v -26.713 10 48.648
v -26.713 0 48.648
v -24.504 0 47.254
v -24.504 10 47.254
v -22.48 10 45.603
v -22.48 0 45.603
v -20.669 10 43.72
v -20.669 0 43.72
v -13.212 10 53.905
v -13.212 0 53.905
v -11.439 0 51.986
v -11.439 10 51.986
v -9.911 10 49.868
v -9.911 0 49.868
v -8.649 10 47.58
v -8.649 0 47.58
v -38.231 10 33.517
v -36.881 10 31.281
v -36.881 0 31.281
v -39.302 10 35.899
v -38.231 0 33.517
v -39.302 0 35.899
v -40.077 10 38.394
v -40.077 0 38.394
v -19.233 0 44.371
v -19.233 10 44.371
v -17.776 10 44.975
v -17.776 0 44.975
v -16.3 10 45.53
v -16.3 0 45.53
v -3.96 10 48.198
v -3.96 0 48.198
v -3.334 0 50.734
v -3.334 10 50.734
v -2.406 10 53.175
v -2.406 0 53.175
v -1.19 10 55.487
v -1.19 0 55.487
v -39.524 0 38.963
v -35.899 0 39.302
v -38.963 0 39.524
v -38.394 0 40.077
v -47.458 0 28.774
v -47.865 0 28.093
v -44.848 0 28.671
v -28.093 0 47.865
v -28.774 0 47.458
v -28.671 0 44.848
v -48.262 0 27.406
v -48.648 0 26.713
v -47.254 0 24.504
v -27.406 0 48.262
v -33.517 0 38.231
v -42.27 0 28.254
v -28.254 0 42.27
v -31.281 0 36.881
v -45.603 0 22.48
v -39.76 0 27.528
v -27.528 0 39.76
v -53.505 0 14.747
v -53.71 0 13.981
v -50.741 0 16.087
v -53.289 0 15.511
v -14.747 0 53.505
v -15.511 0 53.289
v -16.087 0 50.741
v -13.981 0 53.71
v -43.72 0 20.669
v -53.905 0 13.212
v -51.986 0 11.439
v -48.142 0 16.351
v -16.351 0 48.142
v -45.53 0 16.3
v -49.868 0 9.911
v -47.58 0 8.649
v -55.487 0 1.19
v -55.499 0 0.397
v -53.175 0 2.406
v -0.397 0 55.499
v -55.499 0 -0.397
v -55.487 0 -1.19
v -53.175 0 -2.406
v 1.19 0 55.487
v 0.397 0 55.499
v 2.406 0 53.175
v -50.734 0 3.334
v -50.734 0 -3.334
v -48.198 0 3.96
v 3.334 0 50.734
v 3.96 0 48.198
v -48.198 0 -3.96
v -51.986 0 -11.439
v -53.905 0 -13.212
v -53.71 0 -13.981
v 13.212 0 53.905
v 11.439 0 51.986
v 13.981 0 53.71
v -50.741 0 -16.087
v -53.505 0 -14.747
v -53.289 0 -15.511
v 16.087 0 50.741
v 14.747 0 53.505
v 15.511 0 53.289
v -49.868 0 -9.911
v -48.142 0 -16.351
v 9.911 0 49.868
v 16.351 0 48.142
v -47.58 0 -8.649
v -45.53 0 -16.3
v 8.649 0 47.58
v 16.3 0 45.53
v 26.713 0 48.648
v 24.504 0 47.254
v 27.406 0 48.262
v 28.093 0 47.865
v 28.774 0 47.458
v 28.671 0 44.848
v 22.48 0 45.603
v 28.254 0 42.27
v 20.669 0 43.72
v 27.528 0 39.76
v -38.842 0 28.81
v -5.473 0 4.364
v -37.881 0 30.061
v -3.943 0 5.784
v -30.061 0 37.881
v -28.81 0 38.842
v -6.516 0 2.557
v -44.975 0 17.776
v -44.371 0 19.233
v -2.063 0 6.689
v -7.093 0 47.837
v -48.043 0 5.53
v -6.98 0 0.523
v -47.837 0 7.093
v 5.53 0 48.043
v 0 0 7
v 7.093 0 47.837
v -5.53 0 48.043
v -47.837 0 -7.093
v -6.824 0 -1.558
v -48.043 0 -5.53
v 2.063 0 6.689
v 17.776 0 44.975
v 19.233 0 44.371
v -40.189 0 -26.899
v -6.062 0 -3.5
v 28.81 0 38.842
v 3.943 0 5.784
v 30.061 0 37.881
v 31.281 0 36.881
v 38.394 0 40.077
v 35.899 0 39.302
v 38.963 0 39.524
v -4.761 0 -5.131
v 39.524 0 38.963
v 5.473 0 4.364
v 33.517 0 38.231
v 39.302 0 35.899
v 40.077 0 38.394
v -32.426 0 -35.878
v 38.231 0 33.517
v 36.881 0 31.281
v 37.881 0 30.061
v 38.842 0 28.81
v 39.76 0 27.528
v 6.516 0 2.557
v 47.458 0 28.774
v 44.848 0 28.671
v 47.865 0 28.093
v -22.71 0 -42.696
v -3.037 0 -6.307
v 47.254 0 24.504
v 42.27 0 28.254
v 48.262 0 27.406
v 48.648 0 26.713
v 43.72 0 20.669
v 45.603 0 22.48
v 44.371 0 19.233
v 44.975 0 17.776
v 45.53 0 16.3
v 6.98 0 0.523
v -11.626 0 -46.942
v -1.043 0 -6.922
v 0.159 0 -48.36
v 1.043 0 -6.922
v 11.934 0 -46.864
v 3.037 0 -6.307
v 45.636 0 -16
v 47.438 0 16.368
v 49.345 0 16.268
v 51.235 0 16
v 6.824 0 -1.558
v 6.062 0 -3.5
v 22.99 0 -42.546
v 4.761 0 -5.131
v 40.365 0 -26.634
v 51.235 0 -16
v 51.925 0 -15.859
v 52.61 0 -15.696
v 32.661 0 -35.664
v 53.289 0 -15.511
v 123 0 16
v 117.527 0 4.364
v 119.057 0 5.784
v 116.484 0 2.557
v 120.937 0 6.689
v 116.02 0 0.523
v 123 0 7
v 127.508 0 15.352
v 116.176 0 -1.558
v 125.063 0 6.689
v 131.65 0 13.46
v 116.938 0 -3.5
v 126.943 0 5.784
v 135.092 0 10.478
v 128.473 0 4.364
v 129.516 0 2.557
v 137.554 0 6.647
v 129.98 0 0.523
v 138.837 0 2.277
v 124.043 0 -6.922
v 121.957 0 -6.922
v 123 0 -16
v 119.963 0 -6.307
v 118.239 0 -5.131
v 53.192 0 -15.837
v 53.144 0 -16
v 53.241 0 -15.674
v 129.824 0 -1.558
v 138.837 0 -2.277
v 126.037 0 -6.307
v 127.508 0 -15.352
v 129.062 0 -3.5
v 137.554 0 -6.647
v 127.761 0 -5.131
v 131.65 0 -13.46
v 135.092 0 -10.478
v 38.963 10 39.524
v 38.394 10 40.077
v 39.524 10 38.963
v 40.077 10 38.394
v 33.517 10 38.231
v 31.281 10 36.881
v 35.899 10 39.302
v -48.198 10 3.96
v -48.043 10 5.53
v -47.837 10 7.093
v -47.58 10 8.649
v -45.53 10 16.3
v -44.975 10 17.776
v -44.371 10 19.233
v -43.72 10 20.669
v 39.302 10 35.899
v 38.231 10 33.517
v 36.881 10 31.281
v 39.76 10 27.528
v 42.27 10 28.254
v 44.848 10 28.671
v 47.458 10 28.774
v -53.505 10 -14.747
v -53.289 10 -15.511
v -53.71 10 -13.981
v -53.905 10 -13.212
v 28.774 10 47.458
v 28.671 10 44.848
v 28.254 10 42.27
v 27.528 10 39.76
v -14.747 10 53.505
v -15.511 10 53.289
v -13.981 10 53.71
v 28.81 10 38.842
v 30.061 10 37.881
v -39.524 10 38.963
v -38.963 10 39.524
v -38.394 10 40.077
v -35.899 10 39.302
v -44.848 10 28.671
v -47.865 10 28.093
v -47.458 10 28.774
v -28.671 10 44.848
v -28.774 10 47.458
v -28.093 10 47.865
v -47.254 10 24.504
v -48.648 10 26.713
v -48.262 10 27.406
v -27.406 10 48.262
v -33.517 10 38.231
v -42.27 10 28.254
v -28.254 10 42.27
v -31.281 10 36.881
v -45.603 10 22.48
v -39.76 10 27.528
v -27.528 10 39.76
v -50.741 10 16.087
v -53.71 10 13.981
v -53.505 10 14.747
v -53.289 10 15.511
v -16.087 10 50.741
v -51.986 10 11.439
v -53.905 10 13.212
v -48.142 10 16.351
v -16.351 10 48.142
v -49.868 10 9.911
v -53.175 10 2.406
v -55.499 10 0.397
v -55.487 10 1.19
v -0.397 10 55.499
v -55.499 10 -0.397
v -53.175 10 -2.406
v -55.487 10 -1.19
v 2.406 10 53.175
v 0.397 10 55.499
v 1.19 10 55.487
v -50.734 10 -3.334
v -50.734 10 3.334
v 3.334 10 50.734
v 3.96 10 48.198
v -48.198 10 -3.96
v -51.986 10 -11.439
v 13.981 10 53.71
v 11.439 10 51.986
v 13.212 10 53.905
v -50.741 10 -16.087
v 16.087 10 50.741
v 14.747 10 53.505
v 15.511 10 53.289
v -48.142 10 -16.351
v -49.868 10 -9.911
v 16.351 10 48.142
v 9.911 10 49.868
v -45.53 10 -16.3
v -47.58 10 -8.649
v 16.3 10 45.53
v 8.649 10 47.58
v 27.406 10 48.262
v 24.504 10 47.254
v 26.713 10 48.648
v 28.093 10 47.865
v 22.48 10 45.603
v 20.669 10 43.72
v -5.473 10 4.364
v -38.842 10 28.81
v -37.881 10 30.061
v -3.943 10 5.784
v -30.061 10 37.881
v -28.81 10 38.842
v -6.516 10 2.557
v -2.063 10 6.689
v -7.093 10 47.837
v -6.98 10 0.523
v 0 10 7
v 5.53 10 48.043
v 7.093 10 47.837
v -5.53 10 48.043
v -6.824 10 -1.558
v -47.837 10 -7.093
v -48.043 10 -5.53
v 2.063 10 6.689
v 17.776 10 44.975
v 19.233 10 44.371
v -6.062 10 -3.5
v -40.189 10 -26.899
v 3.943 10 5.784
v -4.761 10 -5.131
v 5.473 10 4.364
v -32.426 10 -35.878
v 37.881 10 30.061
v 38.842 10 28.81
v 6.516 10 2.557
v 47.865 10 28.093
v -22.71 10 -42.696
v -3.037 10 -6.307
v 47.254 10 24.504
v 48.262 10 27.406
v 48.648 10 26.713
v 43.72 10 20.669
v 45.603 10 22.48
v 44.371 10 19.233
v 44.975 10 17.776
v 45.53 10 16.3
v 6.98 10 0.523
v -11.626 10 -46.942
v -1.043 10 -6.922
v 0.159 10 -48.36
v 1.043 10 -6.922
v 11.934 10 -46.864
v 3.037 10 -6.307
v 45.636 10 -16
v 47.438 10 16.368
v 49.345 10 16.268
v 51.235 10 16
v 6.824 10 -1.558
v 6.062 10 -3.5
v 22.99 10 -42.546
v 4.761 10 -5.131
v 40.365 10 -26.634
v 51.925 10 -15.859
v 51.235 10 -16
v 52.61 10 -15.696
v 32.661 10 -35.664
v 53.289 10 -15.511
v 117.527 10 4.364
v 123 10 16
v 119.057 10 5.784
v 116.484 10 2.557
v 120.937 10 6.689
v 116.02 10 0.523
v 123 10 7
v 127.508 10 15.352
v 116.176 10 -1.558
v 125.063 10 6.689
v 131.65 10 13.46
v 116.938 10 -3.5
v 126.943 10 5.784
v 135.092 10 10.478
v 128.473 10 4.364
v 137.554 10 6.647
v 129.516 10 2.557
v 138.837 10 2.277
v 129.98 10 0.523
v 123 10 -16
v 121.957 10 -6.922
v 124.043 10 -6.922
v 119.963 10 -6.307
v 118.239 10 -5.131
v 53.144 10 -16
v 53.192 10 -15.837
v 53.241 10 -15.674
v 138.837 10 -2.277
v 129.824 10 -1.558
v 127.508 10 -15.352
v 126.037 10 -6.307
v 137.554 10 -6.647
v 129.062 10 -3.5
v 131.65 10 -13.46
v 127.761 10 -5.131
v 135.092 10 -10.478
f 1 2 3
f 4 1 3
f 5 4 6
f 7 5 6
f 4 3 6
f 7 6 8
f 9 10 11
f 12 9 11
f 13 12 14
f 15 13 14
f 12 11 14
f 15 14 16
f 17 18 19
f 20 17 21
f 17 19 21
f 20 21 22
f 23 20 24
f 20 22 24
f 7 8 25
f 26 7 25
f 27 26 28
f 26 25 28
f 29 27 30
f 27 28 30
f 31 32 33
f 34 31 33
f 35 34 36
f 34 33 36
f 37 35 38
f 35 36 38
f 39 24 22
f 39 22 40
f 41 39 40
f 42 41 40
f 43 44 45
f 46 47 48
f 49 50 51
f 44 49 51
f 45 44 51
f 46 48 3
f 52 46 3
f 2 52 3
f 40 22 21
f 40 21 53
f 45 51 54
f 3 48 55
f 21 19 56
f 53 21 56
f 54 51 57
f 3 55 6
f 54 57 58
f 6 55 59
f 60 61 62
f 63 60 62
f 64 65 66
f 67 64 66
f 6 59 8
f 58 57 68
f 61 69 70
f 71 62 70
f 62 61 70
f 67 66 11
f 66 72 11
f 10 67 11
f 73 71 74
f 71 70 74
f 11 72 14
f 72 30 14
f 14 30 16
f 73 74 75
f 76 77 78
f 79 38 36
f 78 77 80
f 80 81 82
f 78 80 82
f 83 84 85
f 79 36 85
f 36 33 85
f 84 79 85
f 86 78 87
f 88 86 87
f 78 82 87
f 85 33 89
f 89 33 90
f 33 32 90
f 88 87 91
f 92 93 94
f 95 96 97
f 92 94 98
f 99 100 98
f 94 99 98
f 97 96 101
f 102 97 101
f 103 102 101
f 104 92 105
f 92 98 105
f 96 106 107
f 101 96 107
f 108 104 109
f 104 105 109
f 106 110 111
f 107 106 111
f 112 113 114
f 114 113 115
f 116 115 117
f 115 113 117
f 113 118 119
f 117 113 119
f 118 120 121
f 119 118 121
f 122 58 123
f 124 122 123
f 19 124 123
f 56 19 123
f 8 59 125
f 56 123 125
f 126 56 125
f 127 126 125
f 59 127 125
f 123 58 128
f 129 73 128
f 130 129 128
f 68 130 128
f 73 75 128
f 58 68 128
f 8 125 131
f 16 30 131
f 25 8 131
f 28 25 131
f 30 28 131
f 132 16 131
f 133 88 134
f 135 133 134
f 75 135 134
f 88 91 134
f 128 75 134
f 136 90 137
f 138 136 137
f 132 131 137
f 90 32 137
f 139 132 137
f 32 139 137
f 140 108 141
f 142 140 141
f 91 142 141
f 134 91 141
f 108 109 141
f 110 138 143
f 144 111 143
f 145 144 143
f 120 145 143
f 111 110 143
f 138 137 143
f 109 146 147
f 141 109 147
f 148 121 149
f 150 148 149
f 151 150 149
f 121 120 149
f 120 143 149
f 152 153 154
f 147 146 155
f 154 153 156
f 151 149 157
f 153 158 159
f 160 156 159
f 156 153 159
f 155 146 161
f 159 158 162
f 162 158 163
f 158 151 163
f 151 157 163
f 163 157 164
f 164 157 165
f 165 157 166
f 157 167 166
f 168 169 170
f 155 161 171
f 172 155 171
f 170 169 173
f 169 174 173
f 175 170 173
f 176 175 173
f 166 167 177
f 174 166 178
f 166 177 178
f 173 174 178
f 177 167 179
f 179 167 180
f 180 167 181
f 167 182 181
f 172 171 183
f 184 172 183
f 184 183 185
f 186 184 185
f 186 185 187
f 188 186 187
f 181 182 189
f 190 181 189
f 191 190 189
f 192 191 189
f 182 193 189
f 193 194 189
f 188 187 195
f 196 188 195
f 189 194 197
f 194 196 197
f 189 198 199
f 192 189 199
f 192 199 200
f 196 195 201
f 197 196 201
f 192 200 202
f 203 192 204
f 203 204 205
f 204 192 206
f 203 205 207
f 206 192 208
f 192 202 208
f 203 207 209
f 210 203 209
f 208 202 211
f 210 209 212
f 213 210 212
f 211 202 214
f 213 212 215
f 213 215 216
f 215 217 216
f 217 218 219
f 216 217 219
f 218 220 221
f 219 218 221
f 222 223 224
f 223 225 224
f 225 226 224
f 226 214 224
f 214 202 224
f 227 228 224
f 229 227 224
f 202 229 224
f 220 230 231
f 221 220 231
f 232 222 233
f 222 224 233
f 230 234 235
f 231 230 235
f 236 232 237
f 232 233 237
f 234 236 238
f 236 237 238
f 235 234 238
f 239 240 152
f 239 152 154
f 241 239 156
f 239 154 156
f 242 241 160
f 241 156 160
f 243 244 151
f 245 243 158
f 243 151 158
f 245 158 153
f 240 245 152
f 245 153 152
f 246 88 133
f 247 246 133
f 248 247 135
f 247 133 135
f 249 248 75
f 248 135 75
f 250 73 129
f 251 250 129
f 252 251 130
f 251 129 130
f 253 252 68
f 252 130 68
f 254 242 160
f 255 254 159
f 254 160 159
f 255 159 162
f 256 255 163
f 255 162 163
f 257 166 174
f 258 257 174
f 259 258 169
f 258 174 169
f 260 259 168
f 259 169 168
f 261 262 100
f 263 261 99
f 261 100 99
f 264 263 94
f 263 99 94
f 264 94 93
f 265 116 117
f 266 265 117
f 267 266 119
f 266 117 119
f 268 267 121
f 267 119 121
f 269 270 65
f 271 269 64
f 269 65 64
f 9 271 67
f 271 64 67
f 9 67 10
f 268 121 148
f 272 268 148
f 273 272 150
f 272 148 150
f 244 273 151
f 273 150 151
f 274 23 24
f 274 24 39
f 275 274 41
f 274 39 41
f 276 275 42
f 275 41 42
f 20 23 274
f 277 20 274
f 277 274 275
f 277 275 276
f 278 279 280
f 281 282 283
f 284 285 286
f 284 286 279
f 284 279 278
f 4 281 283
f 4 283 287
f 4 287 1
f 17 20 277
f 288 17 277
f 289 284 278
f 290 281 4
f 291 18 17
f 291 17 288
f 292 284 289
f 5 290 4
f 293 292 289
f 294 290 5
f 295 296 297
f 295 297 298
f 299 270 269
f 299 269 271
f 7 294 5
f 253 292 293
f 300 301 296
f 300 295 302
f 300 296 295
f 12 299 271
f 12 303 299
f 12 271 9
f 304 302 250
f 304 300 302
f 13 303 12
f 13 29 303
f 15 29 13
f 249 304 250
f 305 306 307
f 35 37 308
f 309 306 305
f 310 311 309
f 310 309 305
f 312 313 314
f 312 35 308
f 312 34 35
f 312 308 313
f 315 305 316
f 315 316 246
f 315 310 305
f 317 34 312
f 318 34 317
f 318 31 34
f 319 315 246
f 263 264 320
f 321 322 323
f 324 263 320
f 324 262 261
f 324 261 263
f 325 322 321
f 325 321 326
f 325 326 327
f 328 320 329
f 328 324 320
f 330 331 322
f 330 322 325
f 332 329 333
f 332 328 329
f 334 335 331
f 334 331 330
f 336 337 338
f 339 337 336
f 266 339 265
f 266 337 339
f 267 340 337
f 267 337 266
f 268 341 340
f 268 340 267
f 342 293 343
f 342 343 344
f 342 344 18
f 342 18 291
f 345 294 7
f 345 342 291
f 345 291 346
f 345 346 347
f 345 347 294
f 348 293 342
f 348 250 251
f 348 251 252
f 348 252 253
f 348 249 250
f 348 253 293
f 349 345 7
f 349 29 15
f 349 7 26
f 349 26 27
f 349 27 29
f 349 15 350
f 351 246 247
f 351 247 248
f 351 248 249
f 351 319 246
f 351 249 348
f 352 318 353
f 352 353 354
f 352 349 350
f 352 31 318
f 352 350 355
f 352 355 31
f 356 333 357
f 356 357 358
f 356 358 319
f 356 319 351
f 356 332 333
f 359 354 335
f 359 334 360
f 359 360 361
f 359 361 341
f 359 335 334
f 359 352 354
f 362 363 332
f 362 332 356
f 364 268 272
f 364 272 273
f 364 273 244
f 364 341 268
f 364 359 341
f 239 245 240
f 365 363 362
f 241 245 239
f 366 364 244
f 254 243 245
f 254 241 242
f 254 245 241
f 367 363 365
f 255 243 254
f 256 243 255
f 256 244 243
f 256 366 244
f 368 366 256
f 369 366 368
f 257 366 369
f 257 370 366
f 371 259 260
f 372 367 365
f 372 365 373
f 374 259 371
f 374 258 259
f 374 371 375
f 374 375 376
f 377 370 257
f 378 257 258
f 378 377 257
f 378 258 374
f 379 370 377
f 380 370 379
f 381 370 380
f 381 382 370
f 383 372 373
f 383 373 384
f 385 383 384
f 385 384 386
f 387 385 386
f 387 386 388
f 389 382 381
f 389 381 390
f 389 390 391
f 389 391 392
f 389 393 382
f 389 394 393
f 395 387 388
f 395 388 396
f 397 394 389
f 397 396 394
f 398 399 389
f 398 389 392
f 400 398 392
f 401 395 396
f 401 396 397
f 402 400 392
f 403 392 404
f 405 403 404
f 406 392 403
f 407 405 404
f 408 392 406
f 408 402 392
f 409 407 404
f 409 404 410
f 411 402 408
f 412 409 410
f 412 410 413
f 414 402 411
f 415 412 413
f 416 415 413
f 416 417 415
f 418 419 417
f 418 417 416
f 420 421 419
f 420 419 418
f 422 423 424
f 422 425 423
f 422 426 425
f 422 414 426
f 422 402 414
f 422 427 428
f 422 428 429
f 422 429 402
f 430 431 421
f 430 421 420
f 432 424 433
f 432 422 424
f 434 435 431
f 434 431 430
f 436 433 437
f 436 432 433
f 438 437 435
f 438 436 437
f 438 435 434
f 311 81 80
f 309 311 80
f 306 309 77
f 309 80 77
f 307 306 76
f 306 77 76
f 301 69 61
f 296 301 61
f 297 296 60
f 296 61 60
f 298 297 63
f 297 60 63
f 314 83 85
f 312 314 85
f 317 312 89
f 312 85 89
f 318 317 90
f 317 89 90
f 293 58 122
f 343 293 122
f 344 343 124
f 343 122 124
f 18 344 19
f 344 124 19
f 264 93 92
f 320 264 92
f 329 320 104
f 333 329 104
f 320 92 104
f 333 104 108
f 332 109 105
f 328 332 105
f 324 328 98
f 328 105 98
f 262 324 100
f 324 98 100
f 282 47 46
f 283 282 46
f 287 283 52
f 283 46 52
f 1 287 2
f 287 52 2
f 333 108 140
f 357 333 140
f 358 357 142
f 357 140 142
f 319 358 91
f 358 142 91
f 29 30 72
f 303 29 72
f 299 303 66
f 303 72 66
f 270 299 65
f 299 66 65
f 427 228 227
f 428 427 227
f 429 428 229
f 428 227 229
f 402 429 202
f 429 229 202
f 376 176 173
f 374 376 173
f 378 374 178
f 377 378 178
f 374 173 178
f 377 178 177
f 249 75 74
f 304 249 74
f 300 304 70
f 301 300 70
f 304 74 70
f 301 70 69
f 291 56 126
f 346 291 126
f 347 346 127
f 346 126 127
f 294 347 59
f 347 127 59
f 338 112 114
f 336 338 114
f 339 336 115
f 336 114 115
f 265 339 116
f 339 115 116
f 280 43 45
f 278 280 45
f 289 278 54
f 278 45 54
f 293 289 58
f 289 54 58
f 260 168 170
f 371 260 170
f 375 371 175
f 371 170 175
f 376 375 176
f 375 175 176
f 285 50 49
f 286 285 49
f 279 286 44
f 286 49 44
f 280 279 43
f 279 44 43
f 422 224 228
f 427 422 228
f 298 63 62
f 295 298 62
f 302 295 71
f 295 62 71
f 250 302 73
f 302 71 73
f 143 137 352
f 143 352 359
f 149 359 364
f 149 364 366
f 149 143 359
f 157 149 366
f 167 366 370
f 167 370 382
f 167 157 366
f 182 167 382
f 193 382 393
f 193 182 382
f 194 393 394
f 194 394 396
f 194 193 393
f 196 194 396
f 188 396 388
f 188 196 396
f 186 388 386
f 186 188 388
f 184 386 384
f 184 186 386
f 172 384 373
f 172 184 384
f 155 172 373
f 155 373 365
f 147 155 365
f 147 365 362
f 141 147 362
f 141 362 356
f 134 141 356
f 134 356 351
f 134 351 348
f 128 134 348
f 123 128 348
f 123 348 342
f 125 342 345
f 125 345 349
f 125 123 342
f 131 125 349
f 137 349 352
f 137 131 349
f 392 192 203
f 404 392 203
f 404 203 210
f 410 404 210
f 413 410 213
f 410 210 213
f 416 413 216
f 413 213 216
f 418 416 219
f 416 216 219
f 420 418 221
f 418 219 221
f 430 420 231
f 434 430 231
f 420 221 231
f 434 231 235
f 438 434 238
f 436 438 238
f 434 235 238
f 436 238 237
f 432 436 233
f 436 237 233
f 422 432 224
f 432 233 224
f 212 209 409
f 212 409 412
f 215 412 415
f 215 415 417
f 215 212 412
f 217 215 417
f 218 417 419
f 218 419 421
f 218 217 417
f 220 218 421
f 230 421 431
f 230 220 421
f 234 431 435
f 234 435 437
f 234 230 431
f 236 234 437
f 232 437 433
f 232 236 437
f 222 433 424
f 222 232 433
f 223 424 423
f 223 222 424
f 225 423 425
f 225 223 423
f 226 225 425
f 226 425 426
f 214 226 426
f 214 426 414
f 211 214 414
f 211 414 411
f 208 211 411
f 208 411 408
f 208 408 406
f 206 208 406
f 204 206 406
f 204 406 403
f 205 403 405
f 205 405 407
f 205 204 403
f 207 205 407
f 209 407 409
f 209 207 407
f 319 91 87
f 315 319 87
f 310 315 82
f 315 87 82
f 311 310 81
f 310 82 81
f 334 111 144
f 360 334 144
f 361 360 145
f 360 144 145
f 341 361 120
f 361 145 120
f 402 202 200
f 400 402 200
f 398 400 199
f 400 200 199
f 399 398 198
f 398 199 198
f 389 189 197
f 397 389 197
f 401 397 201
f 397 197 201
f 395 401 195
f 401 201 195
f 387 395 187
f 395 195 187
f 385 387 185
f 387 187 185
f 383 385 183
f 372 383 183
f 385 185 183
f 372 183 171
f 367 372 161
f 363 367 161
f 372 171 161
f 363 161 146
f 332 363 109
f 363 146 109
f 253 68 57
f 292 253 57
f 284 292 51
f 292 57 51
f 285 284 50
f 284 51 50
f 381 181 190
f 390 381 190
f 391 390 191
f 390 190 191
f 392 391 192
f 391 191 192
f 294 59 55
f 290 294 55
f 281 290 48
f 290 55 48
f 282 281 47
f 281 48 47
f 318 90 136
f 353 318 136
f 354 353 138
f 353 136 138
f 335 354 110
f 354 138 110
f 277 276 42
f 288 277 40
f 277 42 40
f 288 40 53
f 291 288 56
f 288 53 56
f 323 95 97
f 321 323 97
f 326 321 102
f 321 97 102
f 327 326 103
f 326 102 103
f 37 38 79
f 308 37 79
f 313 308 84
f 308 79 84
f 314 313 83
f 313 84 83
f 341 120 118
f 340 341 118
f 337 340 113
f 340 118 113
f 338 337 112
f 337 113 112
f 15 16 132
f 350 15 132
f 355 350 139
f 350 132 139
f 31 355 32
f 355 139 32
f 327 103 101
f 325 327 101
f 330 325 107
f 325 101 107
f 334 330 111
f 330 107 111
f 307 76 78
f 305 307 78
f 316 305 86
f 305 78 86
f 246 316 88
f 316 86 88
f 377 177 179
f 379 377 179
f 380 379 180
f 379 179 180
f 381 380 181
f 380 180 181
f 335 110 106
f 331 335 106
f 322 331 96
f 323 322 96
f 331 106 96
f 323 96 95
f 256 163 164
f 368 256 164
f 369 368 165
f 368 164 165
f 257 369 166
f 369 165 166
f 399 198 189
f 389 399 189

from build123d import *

# Parameters (mm, degrees)
SKETCH_1_R      = 7
EXTRUDE_2_DEPTH = 10


with BuildPart() as part:
    # 草图1 → 凸台-拉伸2 (new body)
    with BuildSketch(Plane(origin=(0, 0, 0), x_dir=(1, 0, 0), z_dir=(0, 1, 0))):
        with BuildLine():
            Line((51.235128203, 16), (45.636494169, 16))
            ThreePointArc((45.636494169, 16), (0.158881993, 48.359739004), (-45.530376716, 16.299521346))
            ThreePointArc((-45.530376716, 16.299521346), (-49.445367881, 16.258078448), (-53.288564328, 15.510606432))
            ThreePointArc((-53.288564328, 15.510606432), (-53.608883359, 14.364457003), (-53.904553655, 13.211702966))
            ThreePointArc((-53.904553655, 13.211702966), (-50.949983909, 10.642774988), (-47.580223553, 8.649388802))
            ThreePointArc((-47.580223553, 8.649388802), (-47.946273496, 6.312246656), (-48.197593301, 3.96))
            ThreePointArc((-48.197593301, 3.96), (-51.968458166, 2.906694959), (-55.487240876, 1.19))
            ThreePointArc((-55.487240876, 1.19), (-55.5, 0), (-55.487240876, -1.19))
            ThreePointArc((-55.487240876, -1.19), (-51.968458166, -2.906694959), (-48.197593301, -3.96))
            ThreePointArc((-48.197593301, -3.96), (-47.946273496, -6.312246656), (-47.580223553, -8.649388802))
            ThreePointArc((-47.580223553, -8.649388802), (-50.949983909, -10.642774988), (-53.904553655, -13.211702966))
            ThreePointArc((-53.904553655, -13.211702966), (-53.608883359, -14.364457003), (-53.288564328, -15.510606432))
            ThreePointArc((-53.288564328, -15.510606432), (-49.445367881, -16.258078448), (-45.530376716, -16.299521346))
            ThreePointArc((-45.530376716, -16.299521346), (-44.678814192, -18.506570789), (-43.7203402, -20.669336051))
            ThreePointArc((-43.7203402, -20.669336051), (-46.459352447, -23.466957407), (-48.648360184, -26.713050207))
            ThreePointArc((-48.648360184, -26.713050207), (-48.06440991, -27.75), (-47.458360184, -28.774190668))
            ThreePointArc((-47.458360184, -28.774190668), (-43.552657488, -28.501500759), (-39.7603402, -27.528257249))
            ThreePointArc((-39.7603402, -27.528257249), (-38.366567536, -29.439702707), (-36.880987913, -31.280702206))
            ThreePointArc((-36.880987913, -31.280702206), (-38.802592894, -34.691905461), (-40.076861362, -38.393947223))
            ThreePointArc((-40.076861362, -38.393947223), (-39.244426356, -39.244426356), (-38.393947223, -40.076861362))
            ThreePointArc((-38.393947223, -40.076861362), (-34.691905461, -38.802592894), (-31.280702206, -36.880987913))
            ThreePointArc((-31.280702206, -36.880987913), (-29.439702707, -38.366567536), (-27.528257249, -39.7603402))
            ThreePointArc((-27.528257249, -39.7603402), (-28.501500759, -43.552657488), (-28.774190668, -47.458360184))
            ThreePointArc((-28.774190668, -47.458360184), (-27.75, -48.06440991), (-26.713050207, -48.648360184))
            ThreePointArc((-26.713050207, -48.648360184), (-23.466957407, -46.459352447), (-20.669336051, -43.7203402))
            ThreePointArc((-20.669336051, -43.7203402), (-18.506570789, -44.678814192), (-16.299521346, -45.530376716))
            ThreePointArc((-16.299521346, -45.530376716), (-16.258078448, -49.445367881), (-15.510606432, -53.288564328))
            ThreePointArc((-15.510606432, -53.288564328), (-14.364457003, -53.608883359), (-13.211702966, -53.904553655))
            ThreePointArc((-13.211702966, -53.904553655), (-10.642774988, -50.949983909), (-8.649388802, -47.580223553))
            ThreePointArc((-8.649388802, -47.580223553), (-6.312246656, -47.946273496), (-3.96, -48.197593301))
            ThreePointArc((-3.96, -48.197593301), (-2.906694959, -51.968458166), (-1.19, -55.487240876))
            ThreePointArc((-1.19, -55.487240876), (0, -55.5), (1.19, -55.487240876))
            ThreePointArc((1.19, -55.487240876), (2.906694959, -51.968458166), (3.96, -48.197593301))
            ThreePointArc((3.96, -48.197593301), (6.312246656, -47.946273496), (8.649388802, -47.580223553))
            ThreePointArc((8.649388802, -47.580223553), (10.642774988, -50.949983909), (13.211702966, -53.904553655))
            ThreePointArc((13.211702966, -53.904553655), (14.364457003, -53.608883359), (15.510606432, -53.288564328))
            ThreePointArc((15.510606432, -53.288564328), (16.258078448, -49.445367881), (16.299521346, -45.530376716))
            ThreePointArc((16.299521346, -45.530376716), (18.506570789, -44.678814192), (20.669336051, -43.7203402))
            ThreePointArc((20.669336051, -43.7203402), (23.466957407, -46.459352447), (26.713050207, -48.648360184))
            ThreePointArc((26.713050207, -48.648360184), (27.75, -48.06440991), (28.774190668, -47.458360184))
            ThreePointArc((28.774190668, -47.458360184), (28.501500759, -43.552657488), (27.528257249, -39.7603402))
            ThreePointArc((27.528257249, -39.7603402), (29.439702707, -38.366567536), (31.280702206, -36.880987913))
            ThreePointArc((31.280702206, -36.880987913), (34.691905461, -38.802592894), (38.393947223, -40.076861362))
            ThreePointArc((38.393947223, -40.076861362), (39.244426356, -39.244426356), (40.076861362, -38.393947223))
            ThreePointArc((40.076861362, -38.393947223), (38.802592894, -34.691905461), (36.880987913, -31.280702206))
            ThreePointArc((36.880987913, -31.280702206), (38.366567536, -29.439702707), (39.7603402, -27.528257249))
            ThreePointArc((39.7603402, -27.528257249), (43.552657488, -28.501500759), (47.458360184, -28.774190668))
            ThreePointArc((47.458360184, -28.774190668), (48.06440991, -27.75), (48.648360184, -26.713050207))
            ThreePointArc((48.648360184, -26.713050207), (46.459352447, -23.466957407), (43.7203402, -20.669336051))
            ThreePointArc((43.7203402, -20.669336051), (44.678814192, -18.506570789), (45.530376716, -16.299521346))
            ThreePointArc((45.530376716, -16.299521346), (48.39269803, -16.339186258), (51.235128203, -16))
            Line((51.235128203, -16), (123, -16))
            ThreePointArc((123, -16), (139, 0), (123, 16))
            Line((123, 16), (53.143673189, 16))
            ThreePointArc((53.143673189, 16), (53.216681334, 15.755469774), (53.288564328, 15.510606432))
            ThreePointArc((53.288564328, 15.510606432), (52.267828339, 15.780403272), (51.235128203, 16))
        make_face()
        with Locations(Location((0, 0, 0), (0, 0, 270))):
            Circle(SKETCH_1_R, mode=Mode.SUBTRACT)
        with Locations(Location((123, 0, 0), (0, 0, 270))):
            Circle(SKETCH_1_R, mode=Mode.SUBTRACT)
    extrude(amount=EXTRUDE_2_DEPTH)


solid = part.part
